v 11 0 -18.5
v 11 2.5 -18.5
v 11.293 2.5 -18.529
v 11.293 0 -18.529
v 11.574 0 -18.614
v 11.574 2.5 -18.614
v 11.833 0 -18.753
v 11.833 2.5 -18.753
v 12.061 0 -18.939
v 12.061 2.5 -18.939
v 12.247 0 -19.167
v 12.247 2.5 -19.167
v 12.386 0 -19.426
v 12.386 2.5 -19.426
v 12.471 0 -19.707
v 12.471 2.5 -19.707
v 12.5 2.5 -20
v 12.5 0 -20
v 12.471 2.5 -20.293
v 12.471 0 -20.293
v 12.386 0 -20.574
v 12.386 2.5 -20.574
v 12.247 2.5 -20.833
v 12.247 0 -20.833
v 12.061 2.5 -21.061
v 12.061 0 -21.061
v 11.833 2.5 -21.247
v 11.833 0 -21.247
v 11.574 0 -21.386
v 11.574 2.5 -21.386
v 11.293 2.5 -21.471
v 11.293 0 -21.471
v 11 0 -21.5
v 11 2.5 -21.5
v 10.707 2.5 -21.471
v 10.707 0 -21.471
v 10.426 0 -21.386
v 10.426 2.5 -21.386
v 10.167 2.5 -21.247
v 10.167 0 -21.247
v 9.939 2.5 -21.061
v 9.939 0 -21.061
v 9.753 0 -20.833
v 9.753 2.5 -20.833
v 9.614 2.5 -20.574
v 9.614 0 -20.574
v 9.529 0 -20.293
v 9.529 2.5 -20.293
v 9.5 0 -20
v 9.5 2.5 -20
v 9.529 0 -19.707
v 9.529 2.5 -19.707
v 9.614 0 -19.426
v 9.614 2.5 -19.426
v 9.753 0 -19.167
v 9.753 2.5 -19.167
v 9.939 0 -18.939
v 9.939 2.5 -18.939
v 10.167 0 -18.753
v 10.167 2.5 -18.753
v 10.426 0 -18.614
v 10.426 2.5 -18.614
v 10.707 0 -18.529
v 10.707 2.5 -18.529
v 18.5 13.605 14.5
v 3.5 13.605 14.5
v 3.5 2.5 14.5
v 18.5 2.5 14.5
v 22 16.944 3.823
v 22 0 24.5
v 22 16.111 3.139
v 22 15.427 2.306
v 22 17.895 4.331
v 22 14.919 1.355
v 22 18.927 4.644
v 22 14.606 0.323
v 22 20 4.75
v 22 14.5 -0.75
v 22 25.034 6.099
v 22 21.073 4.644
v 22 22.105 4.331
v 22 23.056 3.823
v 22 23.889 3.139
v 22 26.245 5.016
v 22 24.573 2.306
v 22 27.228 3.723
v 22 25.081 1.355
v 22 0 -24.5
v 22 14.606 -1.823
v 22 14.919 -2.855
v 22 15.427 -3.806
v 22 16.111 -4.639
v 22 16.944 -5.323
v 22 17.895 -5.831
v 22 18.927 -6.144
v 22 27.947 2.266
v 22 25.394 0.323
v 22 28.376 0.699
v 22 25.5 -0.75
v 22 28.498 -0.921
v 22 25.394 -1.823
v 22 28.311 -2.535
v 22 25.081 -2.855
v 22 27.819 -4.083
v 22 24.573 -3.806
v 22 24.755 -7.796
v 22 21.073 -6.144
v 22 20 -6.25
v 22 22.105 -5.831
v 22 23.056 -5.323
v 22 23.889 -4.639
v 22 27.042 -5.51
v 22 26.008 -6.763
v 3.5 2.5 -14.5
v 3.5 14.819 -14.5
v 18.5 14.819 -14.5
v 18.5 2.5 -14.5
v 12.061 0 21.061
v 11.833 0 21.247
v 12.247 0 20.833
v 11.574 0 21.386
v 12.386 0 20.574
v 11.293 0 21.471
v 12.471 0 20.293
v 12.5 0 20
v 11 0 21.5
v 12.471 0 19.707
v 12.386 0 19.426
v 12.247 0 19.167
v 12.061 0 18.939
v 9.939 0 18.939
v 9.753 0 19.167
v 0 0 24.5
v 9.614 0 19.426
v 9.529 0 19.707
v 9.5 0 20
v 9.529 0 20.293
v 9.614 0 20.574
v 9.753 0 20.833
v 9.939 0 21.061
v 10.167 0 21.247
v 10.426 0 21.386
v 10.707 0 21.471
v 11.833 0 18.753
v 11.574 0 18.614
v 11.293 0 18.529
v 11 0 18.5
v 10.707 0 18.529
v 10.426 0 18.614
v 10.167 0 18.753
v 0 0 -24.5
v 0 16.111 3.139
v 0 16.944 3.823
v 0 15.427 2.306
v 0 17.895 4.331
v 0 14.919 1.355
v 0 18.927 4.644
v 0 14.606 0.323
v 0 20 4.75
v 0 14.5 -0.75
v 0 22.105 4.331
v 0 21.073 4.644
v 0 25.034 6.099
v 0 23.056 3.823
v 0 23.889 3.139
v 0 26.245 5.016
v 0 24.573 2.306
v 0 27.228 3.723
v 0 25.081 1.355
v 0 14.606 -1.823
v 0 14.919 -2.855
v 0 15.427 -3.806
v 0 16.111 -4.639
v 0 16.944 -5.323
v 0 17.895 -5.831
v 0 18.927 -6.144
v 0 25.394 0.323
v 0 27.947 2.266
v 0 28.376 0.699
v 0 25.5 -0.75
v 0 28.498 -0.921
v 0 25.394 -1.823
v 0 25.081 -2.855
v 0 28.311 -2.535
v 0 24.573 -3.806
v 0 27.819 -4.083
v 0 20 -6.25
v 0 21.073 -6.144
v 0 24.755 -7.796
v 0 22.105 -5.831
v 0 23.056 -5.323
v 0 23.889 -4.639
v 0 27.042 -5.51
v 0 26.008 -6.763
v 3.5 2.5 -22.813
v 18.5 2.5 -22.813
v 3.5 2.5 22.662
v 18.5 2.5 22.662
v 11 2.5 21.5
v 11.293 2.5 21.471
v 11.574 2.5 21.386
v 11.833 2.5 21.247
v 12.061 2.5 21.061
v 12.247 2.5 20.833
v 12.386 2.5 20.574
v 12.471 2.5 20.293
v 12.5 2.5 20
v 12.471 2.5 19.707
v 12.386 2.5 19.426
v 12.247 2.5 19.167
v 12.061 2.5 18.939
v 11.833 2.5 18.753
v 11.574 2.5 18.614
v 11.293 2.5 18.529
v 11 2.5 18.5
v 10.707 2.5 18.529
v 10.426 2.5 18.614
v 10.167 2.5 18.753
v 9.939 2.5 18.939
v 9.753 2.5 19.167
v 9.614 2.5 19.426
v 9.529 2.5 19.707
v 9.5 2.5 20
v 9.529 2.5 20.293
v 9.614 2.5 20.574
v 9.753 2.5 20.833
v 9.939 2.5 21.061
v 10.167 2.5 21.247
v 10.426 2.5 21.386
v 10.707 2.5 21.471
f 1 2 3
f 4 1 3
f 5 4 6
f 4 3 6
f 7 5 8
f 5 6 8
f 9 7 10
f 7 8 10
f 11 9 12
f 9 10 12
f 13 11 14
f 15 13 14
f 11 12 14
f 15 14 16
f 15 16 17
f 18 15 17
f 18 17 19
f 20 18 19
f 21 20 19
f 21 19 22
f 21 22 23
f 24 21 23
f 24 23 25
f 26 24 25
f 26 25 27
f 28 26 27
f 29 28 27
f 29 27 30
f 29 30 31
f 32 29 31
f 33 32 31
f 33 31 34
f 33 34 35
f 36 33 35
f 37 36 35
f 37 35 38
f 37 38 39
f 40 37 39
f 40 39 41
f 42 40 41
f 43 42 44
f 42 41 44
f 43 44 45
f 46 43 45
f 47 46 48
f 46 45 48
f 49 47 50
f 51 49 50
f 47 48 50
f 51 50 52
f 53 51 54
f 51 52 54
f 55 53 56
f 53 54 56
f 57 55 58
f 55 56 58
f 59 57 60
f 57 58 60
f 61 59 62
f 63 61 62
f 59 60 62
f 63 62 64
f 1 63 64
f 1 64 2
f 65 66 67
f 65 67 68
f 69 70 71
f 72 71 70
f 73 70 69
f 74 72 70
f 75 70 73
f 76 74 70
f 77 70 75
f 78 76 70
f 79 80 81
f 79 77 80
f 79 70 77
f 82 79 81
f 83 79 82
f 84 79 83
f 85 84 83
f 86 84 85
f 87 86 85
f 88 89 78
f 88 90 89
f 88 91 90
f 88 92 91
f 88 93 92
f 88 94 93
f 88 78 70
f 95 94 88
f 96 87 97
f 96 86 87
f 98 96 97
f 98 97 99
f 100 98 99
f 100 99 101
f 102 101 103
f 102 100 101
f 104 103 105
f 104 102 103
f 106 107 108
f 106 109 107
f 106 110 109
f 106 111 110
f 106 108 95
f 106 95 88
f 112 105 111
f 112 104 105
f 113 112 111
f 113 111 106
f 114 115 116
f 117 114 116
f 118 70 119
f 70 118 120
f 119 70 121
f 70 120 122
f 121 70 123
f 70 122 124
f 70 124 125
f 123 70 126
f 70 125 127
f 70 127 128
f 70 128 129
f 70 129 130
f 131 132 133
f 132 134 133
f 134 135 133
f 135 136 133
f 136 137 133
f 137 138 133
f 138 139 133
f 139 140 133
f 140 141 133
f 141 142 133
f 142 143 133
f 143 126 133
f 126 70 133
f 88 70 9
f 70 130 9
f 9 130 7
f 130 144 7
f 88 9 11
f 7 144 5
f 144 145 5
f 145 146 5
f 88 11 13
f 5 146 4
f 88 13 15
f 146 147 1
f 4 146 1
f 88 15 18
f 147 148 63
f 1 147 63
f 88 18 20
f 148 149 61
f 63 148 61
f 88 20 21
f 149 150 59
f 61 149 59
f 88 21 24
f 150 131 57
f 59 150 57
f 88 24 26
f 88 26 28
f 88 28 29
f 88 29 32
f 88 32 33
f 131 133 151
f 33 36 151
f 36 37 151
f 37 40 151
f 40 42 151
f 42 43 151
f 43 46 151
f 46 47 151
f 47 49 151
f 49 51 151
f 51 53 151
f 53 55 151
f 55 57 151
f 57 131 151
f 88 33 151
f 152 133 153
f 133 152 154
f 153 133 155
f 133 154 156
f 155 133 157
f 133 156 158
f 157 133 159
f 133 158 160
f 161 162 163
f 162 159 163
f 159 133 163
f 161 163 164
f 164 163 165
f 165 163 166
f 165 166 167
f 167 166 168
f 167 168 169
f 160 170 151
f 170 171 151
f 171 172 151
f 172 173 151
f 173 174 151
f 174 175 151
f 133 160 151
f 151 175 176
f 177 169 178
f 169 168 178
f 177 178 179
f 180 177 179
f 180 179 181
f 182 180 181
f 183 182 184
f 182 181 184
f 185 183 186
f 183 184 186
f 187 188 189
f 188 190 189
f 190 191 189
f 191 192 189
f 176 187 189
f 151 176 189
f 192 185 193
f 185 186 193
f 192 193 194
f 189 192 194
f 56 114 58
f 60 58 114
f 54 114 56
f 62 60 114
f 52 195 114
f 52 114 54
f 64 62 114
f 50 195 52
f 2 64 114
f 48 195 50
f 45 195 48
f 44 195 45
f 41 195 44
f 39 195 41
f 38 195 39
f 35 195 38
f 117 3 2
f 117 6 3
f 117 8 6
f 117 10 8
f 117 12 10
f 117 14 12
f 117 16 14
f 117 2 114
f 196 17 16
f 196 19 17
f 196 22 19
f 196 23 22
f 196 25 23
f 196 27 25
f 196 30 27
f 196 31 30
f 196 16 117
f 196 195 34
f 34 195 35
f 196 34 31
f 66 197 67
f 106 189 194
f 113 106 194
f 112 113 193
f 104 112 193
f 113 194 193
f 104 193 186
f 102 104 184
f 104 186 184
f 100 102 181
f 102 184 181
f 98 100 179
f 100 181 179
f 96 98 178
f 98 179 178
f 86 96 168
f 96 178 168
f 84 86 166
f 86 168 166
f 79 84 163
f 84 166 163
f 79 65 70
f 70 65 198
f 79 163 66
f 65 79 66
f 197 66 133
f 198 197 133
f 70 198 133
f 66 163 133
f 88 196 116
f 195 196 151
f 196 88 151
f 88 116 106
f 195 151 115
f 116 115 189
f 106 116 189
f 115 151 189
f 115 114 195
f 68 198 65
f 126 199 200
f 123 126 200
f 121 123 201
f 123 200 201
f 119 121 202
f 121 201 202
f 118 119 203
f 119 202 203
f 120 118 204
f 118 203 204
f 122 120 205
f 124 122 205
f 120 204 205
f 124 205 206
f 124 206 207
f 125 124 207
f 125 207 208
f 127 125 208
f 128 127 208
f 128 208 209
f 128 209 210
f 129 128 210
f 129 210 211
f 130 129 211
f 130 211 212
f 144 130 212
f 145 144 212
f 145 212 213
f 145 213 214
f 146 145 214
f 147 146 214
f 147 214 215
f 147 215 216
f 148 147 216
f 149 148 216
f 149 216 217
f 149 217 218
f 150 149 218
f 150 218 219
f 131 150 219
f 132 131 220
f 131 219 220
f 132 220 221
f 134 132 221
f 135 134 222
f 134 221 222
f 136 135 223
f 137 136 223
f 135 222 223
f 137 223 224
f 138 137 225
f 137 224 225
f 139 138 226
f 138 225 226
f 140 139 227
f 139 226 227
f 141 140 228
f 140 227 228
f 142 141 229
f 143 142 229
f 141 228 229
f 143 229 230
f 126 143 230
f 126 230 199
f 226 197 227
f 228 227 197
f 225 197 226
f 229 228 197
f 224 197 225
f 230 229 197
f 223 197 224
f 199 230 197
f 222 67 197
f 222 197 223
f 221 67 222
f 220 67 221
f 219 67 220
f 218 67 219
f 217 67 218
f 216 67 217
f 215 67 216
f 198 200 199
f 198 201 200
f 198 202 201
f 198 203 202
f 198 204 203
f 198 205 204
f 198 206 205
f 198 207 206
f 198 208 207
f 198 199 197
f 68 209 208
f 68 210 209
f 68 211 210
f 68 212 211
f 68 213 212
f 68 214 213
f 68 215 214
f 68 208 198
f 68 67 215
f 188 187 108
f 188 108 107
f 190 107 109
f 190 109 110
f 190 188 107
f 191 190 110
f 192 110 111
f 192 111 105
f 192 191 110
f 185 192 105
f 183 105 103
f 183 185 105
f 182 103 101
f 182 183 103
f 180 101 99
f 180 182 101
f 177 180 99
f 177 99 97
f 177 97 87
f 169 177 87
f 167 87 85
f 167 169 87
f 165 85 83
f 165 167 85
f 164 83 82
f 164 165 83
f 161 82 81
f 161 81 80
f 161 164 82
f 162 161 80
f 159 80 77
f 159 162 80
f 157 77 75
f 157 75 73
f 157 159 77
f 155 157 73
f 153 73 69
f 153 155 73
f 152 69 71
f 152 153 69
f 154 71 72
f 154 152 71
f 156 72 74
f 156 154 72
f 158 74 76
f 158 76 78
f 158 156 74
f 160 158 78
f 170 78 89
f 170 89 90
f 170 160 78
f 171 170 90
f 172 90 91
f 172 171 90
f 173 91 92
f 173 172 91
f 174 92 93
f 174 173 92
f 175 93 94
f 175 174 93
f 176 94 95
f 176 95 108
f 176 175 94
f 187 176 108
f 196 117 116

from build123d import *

# Parameters (mm, degrees)
ESBO_O1_R                = 5.5
RESSALTO_EXTRUS_O1_DEPTH = 22
ESBO_O5_W                = 15
ESBO_O5_H                = 10
CORTE_EXTRUS_O3_DEPTH    = 26
ESBO_O6_R                = 1.5
CORTE_EXTRUS_O4_DEPTH    = 44.548823176


with BuildPart() as part:
    # Esboço1 → Ressalto-extrusão1 (new body)
    with BuildSketch(Plane(origin=(0, 0, 0), x_dir=(0, 0, -1), z_dir=(1, 0, 0))):
        with BuildLine():
            Line((24.5, 0), (7.795898562, 24.754504543))
            ThreePointArc((7.795898562, 24.754504543), (0.921060547, 28.498278549), (-6.098863428, 25.034190078))
            Line((-6.098863428, 25.034190078), (-24.5, 0))
            Line((-24.5, 0), (24.5, 0))
        make_face()
        with Locations((0.75, 20)):
            Circle(ESBO_O1_R, mode=Mode.SUBTRACT)
    extrude(amount=RESSALTO_EXTRUS_O1_DEPTH)

    # Esboço5 → Corte-extrusão3 (cut)
    with BuildSketch(Plane(origin=(0, 28.5, 0), x_dir=(1, 0, 0), z_dir=(0, 1, 0))):
        with Locations((11, 19.5)):
            Rectangle(ESBO_O5_W, ESBO_O5_H)
        with Locations((11, -19.5)):
            Rectangle(ESBO_O5_W, ESBO_O5_H)
    extrude(amount=-CORTE_EXTRUS_O3_DEPTH, mode=Mode.SUBTRACT)

    # Esboço6 → Corte-extrusão4 (cut, through all)
    with BuildSketch(Plane(origin=(0, 28.5, 0), x_dir=(1, 0, 0), z_dir=(0, 1, 0))):
        with Locations(Location((11, 20, 0), (0, 0, 270))):
            Circle(ESBO_O6_R)
        with Locations(Location((11, -20, 0), (0, 0, 270))):
            Circle(ESBO_O6_R)
    extrude(amount=-CORTE_EXTRUS_O4_DEPTH, mode=Mode.SUBTRACT)


solid = part.part
